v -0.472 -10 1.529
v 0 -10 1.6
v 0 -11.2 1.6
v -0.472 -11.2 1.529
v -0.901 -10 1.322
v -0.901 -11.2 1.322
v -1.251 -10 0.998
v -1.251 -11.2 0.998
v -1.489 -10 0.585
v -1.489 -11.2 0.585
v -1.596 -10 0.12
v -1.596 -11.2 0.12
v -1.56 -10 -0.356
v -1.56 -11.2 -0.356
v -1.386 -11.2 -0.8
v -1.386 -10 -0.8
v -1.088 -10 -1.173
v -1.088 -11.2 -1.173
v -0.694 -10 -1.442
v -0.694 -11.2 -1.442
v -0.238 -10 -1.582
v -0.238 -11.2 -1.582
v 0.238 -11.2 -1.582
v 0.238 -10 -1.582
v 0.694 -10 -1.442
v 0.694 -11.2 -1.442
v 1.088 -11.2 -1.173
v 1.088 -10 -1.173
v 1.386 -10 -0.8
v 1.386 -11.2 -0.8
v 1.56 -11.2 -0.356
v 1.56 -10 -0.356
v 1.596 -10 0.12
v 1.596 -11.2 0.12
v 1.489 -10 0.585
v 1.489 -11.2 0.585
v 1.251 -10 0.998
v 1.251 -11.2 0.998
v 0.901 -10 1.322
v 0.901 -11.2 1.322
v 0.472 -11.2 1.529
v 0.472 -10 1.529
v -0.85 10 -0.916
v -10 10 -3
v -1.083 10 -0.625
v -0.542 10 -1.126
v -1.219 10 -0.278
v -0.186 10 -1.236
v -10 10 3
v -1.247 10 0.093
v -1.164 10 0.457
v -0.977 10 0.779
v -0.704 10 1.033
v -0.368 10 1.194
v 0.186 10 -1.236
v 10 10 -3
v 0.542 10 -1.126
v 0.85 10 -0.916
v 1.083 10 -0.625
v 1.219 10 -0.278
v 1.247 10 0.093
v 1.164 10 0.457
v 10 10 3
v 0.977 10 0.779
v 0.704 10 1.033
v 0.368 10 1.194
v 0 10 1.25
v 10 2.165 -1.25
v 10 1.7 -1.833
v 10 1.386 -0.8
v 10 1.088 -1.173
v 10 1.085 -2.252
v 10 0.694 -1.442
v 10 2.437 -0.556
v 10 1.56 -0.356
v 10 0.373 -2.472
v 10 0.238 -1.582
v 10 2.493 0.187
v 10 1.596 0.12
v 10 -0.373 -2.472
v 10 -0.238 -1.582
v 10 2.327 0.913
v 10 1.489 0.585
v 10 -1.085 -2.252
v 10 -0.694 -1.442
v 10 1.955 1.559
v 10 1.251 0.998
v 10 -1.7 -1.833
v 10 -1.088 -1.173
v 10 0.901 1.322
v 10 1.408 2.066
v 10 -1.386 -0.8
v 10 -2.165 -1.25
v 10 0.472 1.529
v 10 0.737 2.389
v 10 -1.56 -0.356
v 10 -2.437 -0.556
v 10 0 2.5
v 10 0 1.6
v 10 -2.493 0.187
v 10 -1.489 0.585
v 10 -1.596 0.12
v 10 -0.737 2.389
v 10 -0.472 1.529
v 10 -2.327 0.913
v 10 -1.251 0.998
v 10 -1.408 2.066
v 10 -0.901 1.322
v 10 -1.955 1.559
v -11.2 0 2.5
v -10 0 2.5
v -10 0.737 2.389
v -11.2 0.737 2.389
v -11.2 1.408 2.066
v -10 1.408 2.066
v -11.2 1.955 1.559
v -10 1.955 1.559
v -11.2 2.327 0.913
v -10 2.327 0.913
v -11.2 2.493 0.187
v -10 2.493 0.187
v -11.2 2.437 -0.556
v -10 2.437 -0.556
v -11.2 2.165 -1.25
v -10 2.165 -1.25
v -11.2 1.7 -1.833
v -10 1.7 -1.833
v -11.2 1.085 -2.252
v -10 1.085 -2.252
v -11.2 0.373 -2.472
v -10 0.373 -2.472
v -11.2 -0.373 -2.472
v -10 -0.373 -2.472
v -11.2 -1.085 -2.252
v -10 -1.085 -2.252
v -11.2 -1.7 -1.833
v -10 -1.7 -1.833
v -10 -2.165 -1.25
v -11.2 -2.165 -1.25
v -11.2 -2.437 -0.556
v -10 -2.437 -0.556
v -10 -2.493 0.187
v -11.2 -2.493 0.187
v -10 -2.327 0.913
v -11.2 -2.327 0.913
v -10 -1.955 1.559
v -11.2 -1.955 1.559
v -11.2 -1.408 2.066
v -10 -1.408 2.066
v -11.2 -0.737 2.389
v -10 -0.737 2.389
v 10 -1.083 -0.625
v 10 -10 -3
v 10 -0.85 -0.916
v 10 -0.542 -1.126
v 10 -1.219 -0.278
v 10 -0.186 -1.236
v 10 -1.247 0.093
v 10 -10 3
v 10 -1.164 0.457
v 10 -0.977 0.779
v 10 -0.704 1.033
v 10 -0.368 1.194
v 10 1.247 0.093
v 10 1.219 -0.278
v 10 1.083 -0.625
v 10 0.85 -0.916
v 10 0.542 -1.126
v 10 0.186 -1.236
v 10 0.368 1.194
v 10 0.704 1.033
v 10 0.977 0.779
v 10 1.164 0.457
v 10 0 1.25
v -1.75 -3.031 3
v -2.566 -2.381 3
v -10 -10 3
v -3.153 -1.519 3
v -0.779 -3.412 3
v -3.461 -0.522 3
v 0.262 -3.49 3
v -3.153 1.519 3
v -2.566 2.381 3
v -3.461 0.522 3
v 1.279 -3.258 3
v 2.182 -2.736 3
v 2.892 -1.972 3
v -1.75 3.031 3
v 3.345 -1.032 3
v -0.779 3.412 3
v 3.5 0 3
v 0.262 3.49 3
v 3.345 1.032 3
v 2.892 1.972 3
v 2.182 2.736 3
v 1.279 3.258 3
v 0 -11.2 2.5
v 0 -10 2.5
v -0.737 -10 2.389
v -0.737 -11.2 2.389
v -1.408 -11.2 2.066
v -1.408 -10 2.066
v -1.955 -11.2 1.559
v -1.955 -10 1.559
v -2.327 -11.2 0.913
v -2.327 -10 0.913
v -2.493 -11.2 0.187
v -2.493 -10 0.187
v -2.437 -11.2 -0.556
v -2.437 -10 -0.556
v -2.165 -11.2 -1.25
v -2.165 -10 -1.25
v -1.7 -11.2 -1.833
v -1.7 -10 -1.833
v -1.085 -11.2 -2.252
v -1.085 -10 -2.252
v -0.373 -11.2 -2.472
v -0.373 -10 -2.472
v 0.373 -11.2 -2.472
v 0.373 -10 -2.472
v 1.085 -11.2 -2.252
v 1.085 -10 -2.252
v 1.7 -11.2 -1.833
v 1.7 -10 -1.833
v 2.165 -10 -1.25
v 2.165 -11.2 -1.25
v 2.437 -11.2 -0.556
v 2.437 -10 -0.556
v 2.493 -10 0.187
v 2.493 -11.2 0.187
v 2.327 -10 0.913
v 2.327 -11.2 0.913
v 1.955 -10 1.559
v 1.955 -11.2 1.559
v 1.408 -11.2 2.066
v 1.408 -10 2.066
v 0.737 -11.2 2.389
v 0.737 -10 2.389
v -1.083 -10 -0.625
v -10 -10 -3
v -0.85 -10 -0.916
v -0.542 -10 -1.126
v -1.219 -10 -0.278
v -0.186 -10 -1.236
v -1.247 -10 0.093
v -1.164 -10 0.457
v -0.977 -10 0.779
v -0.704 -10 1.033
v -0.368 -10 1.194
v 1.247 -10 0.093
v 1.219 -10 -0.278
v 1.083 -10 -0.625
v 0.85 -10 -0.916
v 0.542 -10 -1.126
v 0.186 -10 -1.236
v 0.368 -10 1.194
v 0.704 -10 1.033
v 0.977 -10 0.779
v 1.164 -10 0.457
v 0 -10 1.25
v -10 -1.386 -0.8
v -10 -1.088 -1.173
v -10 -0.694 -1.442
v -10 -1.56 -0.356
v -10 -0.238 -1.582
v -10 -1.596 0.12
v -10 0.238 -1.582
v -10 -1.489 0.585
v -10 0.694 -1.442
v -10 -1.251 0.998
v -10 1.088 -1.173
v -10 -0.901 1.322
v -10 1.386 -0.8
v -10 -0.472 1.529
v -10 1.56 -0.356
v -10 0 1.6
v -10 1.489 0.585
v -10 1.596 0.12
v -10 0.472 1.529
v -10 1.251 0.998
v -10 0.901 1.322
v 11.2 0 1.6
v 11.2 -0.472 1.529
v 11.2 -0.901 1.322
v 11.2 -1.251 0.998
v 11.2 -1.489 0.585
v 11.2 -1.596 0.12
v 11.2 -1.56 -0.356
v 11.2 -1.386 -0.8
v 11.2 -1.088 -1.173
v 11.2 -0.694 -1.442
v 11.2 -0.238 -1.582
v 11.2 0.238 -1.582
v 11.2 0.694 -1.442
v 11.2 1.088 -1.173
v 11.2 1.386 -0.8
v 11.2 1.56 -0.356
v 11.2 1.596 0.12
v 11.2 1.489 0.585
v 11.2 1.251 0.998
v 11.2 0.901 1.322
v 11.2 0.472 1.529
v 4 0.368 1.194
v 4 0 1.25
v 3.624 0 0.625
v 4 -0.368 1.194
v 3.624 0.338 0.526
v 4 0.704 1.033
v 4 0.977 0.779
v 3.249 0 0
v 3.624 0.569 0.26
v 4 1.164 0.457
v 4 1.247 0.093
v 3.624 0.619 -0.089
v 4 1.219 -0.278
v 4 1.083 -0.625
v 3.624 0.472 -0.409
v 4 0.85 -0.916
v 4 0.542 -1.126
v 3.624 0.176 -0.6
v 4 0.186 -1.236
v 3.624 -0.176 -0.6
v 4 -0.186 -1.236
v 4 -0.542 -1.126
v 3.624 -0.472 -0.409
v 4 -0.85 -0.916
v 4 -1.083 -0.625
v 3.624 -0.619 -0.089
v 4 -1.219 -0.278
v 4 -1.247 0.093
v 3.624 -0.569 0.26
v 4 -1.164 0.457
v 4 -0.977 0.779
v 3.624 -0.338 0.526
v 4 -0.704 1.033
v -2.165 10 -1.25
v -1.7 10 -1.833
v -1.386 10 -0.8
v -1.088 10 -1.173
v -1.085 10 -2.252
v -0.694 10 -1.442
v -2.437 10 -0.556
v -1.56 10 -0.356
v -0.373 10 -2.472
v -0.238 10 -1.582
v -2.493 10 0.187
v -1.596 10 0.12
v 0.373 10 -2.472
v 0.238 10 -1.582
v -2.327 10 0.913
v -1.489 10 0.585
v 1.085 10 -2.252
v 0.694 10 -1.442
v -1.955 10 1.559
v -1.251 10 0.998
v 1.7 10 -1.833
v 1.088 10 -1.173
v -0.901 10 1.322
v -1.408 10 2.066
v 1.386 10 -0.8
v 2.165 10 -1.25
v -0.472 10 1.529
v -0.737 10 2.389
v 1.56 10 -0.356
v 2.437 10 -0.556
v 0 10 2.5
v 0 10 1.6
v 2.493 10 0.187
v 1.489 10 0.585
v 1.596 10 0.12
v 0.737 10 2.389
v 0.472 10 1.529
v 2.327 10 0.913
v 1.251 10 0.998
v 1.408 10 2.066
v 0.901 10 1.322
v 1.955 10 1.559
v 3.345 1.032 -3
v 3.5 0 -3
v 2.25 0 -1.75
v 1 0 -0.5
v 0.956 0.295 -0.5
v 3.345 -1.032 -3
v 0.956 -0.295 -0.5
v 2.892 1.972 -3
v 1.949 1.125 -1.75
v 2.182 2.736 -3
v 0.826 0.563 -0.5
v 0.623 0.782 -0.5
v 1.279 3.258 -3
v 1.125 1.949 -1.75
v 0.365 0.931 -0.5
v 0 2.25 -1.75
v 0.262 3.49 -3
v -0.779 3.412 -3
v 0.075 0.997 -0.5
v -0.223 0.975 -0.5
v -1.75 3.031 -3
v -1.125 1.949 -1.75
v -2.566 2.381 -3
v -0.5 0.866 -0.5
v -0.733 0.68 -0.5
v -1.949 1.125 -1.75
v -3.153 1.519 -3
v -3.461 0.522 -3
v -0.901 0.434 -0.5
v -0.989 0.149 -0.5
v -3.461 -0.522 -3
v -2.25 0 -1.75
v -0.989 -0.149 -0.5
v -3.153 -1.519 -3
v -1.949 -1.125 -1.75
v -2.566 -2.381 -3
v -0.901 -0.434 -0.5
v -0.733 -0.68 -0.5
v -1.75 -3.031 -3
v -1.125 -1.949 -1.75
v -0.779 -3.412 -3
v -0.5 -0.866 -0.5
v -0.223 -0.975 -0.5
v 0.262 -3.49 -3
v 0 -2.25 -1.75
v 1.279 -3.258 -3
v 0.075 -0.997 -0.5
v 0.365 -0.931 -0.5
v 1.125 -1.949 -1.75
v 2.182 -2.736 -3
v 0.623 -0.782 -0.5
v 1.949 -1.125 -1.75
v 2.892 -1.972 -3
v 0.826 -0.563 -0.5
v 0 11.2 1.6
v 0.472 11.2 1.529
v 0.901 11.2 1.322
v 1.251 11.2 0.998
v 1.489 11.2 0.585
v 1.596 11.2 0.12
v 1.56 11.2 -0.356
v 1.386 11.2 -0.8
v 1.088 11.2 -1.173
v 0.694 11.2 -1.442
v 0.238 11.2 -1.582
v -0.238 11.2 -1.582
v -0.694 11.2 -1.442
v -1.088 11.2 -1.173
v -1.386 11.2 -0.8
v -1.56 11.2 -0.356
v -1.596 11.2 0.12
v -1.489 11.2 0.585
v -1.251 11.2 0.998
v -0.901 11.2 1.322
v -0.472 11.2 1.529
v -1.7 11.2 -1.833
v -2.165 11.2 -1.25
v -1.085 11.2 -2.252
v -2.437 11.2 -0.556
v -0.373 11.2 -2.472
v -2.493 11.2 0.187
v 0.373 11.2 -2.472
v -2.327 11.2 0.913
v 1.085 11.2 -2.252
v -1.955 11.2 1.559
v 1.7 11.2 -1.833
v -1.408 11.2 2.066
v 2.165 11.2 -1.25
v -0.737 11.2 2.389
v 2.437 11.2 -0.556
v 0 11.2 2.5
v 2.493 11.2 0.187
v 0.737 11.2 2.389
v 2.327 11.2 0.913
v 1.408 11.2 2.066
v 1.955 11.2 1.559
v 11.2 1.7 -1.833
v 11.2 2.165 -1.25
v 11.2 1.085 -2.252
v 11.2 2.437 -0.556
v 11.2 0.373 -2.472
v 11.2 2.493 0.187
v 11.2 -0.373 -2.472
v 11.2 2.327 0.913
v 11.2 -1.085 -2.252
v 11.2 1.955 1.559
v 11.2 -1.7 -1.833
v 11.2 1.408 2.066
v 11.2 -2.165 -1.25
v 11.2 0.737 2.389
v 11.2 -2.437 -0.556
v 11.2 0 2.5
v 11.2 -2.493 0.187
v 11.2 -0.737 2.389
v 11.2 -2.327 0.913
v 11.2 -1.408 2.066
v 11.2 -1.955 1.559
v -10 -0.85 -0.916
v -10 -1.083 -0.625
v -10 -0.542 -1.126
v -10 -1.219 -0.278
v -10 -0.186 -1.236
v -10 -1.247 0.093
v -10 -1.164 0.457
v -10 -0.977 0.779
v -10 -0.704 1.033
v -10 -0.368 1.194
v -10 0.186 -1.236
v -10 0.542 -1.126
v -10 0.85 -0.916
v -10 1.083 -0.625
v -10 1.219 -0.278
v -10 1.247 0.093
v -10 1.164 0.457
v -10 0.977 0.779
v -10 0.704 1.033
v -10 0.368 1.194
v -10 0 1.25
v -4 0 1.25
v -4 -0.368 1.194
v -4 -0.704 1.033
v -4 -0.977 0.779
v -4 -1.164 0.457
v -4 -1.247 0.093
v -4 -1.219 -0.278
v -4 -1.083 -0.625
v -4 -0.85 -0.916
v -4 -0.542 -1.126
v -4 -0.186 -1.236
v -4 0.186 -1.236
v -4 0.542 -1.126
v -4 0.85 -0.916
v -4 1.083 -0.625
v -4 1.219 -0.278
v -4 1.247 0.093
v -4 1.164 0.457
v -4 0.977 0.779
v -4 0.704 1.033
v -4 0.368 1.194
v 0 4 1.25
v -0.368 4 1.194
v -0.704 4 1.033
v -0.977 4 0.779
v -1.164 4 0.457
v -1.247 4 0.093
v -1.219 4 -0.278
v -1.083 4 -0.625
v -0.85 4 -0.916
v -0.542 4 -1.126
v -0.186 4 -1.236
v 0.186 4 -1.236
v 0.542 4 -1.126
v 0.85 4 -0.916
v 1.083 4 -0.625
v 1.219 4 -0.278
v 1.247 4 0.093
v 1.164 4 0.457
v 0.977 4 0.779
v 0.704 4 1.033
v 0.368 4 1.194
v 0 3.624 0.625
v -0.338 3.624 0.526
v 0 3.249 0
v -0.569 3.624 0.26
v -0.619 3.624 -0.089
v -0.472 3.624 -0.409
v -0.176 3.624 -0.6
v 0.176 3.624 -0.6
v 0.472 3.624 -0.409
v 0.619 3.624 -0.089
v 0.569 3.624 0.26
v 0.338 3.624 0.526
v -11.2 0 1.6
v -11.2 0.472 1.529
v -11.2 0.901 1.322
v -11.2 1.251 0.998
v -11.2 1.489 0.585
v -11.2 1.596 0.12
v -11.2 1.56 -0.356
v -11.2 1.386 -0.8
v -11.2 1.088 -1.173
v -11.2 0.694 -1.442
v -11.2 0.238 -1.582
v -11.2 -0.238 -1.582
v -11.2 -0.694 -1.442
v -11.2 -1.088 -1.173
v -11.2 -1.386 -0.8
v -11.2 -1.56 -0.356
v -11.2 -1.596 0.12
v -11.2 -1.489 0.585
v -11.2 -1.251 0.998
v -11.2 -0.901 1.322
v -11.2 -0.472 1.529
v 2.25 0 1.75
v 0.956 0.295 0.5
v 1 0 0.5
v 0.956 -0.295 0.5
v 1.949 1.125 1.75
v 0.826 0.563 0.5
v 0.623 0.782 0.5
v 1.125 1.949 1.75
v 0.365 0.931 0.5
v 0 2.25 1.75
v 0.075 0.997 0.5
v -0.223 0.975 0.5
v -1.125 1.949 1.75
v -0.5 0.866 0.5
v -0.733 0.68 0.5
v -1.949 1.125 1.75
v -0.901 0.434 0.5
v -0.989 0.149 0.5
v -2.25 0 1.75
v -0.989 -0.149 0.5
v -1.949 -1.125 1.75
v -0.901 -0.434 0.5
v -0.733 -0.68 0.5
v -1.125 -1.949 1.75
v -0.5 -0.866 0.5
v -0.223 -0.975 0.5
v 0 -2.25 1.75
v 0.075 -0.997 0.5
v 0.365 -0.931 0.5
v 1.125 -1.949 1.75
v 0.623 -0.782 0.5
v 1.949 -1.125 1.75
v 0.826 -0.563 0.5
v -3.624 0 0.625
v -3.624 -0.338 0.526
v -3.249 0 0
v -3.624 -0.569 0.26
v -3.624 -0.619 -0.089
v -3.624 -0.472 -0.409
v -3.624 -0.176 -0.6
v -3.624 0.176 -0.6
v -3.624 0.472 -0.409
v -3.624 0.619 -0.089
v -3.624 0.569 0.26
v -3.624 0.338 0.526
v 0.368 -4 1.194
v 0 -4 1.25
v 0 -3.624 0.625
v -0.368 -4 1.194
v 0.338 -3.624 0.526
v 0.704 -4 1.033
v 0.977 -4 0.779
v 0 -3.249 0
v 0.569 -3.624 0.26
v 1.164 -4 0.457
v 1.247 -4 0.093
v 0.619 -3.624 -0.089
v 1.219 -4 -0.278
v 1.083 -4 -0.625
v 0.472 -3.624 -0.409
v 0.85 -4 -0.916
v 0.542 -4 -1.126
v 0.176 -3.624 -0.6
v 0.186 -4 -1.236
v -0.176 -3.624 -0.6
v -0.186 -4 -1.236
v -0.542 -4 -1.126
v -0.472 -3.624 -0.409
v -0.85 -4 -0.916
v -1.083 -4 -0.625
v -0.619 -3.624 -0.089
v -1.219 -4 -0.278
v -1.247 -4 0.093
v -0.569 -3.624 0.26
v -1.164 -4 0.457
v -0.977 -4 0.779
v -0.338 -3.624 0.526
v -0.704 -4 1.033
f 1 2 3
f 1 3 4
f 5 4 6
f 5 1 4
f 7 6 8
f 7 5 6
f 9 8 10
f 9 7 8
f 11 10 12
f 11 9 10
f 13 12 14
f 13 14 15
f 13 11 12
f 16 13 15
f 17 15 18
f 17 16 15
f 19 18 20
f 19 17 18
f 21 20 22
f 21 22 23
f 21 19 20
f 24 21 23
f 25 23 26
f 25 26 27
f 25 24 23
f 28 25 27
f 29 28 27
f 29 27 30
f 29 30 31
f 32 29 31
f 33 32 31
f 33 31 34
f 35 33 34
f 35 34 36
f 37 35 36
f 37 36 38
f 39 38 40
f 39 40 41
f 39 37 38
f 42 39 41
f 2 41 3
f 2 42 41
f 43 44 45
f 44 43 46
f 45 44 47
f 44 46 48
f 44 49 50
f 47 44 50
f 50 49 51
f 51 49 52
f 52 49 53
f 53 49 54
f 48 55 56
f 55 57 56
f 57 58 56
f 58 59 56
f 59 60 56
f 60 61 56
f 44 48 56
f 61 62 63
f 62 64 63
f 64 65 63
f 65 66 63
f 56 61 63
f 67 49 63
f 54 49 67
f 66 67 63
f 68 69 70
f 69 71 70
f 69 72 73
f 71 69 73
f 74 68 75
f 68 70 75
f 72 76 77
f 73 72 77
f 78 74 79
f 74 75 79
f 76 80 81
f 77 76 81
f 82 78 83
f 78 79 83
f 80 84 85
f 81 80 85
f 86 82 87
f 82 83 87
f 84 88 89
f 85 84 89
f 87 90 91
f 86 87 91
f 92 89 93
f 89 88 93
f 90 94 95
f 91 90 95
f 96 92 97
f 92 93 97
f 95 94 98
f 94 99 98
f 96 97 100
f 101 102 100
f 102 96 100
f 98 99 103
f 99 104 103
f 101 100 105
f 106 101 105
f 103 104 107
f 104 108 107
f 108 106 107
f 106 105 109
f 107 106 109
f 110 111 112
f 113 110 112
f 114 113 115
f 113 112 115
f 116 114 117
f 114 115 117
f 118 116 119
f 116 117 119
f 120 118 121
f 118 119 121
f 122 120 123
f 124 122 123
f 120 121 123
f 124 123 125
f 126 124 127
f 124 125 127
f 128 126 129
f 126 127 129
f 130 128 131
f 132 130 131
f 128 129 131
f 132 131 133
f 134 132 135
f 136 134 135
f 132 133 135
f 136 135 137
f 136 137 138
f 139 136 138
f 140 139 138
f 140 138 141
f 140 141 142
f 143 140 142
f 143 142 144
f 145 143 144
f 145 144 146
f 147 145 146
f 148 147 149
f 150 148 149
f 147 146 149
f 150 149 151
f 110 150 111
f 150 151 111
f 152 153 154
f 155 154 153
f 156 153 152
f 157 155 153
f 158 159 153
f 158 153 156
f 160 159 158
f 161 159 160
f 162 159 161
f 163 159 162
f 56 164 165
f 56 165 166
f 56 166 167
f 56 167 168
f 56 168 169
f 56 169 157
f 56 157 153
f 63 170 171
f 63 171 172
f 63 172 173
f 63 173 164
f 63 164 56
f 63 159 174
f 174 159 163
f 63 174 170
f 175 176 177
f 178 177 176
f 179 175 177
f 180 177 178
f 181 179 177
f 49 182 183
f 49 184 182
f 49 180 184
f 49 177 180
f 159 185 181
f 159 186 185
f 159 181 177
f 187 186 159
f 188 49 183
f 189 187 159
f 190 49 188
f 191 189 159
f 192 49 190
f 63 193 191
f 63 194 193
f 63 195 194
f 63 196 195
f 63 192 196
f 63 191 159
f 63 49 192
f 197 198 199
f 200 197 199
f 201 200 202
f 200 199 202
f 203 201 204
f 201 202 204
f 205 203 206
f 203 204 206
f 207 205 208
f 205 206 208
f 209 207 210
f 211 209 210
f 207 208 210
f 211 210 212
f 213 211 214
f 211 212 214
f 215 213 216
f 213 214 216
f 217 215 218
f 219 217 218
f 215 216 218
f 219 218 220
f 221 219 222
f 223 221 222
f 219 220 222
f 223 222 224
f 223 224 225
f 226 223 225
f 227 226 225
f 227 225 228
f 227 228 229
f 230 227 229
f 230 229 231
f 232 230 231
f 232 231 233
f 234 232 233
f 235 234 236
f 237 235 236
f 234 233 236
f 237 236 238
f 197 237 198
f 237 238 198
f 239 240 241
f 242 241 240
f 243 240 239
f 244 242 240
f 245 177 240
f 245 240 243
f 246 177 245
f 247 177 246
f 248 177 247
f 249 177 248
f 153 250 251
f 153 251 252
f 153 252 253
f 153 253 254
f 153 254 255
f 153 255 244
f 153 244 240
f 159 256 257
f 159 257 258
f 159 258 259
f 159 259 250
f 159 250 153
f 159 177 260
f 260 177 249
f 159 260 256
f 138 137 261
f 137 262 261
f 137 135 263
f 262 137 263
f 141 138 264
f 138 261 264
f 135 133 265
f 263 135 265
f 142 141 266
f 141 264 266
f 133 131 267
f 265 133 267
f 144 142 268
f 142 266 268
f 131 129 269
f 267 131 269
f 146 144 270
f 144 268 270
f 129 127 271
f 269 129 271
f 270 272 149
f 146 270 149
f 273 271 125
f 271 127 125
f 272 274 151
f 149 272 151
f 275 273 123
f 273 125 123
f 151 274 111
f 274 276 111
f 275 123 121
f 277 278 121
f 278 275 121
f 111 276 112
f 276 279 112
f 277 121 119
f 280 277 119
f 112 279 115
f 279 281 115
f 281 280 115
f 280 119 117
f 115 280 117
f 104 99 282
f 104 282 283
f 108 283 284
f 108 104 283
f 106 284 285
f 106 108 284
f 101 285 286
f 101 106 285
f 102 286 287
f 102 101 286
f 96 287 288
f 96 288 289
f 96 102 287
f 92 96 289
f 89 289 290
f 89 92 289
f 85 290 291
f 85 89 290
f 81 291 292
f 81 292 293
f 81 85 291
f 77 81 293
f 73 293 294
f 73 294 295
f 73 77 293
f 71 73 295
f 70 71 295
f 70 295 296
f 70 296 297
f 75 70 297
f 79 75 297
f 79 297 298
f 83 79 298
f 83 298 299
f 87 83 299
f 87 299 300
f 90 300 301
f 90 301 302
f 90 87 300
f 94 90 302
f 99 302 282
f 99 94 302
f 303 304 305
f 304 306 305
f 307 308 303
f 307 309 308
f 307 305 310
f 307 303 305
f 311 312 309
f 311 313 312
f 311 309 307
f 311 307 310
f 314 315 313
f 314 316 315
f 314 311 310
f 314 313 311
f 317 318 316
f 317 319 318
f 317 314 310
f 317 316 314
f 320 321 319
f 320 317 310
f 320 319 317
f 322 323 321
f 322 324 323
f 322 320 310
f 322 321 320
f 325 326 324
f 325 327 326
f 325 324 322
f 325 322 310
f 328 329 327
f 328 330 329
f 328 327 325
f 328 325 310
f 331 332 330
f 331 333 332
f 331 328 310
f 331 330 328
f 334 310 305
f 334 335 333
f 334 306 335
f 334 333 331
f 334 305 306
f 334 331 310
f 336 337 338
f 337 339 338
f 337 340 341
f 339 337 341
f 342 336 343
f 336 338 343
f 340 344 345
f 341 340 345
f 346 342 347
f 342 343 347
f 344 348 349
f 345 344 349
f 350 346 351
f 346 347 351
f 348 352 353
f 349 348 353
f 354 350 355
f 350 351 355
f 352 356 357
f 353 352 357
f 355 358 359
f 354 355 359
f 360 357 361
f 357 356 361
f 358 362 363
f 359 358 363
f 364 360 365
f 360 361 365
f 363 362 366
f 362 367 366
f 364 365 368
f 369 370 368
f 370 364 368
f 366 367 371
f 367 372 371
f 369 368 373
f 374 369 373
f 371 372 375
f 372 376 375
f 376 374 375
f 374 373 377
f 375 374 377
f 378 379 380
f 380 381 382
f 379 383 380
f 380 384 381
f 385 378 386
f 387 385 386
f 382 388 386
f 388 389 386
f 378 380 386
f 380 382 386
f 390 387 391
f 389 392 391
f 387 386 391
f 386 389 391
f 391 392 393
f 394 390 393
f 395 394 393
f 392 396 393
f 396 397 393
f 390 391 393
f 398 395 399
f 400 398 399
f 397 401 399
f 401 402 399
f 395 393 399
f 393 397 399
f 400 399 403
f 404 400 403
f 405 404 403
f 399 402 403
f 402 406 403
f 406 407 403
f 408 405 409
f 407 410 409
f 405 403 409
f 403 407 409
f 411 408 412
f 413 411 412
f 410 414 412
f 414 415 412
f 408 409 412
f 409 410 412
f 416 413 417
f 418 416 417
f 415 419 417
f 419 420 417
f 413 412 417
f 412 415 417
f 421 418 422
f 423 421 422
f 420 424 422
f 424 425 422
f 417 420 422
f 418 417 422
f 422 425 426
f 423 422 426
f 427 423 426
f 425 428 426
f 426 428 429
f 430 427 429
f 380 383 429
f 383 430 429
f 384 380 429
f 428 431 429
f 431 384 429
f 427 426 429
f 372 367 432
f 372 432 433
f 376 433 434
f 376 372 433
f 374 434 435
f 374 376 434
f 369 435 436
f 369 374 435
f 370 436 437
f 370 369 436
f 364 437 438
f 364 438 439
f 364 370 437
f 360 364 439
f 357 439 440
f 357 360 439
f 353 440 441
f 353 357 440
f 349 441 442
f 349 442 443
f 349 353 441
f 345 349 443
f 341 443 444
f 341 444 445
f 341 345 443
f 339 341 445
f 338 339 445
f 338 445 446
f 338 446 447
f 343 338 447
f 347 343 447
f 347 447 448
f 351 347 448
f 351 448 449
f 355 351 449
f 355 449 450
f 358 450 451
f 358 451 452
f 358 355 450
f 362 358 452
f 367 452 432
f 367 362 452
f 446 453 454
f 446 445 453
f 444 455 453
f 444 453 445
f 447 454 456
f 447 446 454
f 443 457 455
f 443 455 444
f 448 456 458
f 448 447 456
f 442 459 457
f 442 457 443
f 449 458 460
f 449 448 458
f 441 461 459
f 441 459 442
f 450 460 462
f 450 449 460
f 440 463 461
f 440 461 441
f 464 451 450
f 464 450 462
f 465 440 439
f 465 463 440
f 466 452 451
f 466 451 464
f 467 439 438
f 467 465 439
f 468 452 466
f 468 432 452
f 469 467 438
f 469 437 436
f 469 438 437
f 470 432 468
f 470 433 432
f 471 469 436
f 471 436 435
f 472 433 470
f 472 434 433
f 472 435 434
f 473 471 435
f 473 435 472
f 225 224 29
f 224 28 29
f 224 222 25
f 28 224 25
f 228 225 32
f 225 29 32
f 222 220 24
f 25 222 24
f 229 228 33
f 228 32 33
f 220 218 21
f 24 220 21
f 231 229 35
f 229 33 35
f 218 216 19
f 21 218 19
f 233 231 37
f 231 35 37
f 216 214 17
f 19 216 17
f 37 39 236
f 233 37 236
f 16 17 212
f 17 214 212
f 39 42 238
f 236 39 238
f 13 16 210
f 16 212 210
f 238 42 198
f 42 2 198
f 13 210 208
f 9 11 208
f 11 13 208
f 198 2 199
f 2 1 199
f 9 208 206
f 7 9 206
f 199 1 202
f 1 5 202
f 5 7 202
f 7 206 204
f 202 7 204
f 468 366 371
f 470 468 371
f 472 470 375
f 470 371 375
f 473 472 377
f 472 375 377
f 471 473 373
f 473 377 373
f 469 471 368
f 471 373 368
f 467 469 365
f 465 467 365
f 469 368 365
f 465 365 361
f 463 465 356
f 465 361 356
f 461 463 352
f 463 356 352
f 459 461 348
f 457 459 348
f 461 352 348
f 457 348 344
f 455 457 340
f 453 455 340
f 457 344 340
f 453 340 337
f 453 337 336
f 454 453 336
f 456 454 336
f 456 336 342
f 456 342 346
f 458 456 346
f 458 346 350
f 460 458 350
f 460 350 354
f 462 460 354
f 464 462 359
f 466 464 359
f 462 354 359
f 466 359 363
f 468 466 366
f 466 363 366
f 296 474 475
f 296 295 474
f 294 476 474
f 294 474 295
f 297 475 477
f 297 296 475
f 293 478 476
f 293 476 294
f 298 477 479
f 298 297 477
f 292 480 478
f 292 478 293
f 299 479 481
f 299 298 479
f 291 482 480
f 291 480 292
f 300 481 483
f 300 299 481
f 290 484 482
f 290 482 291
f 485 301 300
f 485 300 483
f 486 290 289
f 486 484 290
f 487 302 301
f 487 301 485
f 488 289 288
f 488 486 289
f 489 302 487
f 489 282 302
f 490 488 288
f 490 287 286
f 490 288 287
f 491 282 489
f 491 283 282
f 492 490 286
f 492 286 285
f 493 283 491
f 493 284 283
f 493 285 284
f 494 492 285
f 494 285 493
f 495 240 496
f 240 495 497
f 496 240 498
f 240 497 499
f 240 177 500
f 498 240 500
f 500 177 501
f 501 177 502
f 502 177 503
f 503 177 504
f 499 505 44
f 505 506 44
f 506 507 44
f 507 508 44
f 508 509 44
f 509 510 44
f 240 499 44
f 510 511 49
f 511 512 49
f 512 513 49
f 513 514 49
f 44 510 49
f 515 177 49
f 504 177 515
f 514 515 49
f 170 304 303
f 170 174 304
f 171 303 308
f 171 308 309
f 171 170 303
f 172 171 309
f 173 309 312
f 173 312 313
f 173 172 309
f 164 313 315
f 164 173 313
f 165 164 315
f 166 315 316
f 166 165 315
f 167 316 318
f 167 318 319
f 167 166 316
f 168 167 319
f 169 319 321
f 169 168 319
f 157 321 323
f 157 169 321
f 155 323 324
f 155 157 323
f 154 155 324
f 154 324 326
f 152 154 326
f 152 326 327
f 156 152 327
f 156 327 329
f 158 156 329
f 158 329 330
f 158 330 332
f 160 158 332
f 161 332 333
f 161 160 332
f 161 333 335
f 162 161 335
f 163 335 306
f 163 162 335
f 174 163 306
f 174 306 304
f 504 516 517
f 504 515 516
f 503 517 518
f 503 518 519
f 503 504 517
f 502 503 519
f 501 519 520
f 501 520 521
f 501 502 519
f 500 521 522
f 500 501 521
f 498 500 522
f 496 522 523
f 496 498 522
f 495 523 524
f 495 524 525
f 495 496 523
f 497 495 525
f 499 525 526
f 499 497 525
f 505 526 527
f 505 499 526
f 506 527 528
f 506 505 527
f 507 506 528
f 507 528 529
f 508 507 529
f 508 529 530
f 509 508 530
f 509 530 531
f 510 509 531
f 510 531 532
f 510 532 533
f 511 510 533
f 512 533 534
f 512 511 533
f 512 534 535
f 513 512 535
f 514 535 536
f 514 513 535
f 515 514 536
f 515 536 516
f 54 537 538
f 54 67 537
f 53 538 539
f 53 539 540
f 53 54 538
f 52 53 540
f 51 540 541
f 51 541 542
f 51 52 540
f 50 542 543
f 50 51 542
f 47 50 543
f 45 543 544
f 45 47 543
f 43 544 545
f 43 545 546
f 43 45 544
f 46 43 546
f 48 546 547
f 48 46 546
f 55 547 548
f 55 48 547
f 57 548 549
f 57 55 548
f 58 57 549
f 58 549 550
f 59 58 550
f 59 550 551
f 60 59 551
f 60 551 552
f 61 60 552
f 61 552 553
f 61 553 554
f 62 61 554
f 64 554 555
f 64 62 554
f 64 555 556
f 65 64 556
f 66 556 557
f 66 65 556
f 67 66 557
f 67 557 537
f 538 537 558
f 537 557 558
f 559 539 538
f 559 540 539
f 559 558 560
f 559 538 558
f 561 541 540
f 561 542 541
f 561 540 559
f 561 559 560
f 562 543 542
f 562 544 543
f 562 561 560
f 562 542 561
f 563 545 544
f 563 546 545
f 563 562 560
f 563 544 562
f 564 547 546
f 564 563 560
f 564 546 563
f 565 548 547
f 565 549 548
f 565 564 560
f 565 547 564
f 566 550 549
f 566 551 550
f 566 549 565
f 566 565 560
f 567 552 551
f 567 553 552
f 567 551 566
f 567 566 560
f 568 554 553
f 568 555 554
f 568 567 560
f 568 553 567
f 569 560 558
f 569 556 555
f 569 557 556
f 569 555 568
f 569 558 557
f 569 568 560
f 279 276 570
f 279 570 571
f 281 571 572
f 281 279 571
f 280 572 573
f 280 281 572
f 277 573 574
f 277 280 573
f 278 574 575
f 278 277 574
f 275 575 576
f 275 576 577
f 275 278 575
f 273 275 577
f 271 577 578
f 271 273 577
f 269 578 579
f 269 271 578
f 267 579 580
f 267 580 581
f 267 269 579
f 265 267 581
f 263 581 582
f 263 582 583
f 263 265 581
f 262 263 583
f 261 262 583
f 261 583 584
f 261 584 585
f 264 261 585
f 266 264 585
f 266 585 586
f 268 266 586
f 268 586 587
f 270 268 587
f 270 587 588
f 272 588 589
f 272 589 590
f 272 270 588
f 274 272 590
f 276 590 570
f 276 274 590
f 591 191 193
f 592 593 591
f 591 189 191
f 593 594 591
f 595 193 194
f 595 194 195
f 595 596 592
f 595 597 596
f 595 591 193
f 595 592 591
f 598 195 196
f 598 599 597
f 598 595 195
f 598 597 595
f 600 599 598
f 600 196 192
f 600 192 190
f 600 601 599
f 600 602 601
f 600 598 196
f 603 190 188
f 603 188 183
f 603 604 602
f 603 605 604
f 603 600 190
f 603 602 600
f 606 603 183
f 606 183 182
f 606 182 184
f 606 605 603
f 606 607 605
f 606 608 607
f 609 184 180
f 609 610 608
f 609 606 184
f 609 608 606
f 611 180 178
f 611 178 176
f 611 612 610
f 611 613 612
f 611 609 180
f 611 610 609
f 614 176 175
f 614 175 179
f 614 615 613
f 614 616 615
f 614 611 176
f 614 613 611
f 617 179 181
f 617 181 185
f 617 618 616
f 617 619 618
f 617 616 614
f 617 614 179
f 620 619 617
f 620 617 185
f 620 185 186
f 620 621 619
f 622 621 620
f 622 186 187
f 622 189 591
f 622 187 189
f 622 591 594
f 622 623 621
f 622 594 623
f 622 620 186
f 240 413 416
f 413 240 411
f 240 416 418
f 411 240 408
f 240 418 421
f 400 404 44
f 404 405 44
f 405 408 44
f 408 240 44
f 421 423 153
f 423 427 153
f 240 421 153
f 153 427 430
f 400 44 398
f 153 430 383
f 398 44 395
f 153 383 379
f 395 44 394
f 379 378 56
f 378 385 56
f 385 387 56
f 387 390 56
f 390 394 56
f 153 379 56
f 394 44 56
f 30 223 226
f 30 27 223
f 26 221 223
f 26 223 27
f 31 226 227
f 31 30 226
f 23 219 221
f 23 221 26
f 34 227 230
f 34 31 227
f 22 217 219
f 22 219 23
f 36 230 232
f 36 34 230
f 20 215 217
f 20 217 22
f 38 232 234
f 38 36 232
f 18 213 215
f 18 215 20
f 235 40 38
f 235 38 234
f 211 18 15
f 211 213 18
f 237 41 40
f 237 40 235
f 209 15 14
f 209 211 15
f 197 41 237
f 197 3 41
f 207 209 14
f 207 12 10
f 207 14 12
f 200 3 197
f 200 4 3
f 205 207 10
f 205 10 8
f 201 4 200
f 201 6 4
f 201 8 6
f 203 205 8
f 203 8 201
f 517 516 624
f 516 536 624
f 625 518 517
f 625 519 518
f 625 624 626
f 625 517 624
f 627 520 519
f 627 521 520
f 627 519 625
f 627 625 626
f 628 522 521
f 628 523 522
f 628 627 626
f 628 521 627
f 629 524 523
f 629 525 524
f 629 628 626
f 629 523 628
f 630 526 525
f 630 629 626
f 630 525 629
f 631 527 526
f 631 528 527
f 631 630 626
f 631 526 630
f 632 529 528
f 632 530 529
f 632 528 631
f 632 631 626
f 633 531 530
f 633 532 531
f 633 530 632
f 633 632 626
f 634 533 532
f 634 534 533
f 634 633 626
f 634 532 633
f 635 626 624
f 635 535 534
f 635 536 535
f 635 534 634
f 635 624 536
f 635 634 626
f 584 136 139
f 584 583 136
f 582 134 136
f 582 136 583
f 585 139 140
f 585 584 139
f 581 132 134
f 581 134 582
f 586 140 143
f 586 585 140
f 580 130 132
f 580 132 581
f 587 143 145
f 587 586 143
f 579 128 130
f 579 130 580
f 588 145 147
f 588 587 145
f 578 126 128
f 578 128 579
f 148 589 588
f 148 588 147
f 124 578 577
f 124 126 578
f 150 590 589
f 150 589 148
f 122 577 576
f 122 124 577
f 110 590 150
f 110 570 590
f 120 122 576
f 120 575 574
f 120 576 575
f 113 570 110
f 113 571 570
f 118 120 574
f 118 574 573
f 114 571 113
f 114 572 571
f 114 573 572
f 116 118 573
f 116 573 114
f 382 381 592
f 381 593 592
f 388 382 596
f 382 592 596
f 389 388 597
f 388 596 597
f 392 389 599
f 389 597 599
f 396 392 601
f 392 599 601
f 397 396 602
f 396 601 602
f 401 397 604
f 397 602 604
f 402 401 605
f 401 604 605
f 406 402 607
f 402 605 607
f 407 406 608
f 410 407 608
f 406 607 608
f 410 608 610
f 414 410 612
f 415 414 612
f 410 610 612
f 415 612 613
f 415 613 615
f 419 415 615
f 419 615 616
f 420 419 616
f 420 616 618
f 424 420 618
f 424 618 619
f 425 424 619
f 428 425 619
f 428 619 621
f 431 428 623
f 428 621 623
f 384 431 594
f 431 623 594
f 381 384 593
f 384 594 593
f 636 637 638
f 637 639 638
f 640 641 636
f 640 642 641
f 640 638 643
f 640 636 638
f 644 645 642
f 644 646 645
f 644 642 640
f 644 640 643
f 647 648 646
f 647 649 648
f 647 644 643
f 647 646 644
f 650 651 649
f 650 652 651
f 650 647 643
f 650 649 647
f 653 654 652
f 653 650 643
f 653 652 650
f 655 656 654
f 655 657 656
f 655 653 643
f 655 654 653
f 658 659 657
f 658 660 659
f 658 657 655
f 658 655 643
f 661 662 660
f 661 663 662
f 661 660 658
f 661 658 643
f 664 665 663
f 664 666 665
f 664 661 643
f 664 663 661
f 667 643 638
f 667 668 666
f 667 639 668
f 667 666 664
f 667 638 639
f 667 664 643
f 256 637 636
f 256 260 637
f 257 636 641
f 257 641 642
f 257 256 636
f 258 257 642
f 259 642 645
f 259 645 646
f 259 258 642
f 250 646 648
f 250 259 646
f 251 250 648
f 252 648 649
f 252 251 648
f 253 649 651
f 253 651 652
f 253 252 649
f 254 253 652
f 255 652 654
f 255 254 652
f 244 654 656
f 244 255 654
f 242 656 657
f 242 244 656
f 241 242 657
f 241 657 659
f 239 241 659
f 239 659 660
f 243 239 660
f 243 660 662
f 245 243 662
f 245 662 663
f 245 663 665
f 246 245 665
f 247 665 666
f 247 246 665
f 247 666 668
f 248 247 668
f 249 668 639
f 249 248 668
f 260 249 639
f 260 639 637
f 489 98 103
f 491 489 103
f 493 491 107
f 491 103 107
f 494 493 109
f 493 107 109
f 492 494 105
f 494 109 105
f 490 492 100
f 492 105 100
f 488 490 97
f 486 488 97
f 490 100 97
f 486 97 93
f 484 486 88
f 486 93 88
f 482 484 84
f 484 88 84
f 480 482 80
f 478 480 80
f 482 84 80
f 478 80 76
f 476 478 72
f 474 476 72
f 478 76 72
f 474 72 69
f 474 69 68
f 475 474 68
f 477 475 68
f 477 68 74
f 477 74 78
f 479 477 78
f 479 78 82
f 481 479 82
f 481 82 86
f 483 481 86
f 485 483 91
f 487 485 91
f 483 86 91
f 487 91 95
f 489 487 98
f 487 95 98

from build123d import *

# Parameters (mm, degrees)
SKETCH_1_W               = 20
SKETCH_1_H               = 20
SKETCH_1_R               = 1
EXTRUDE_1_DEPTH          = 3
PATTERN_CIRCULAR_1_COUNT = 4
SKETCH_6_R               = 2.5
SKETCH_6_R_2             = 1.6
EXTRUDE_2_DEPTH          = 1.2
PATTERN_CIRCULAR_2_COUNT = 4


with BuildPart() as part:
    # ｽｹｯﾁ1 → ﾎﾞｽ - 押し出し1 (new body)
    with BuildSketch(Plane.XY):
        Rectangle(SKETCH_1_W, SKETCH_1_H)
        Circle(SKETCH_1_R, mode=Mode.SUBTRACT)
    extrude(amount=EXTRUDE_1_DEPTH)

    # ｽｹｯﾁ2 → ｶｯﾄ - 回転1 (revolve, cut)
    with BuildSketch(Plane(origin=(0, 0, 0), x_dir=(1, 0, 0), z_dir=(0, 1, 0))):
        Polygon((1, -0.5), (0, -0.5), (0, -3), (3.5, -3), align=None)
    revolve(axis=Axis((0, 0, 0.5), (0, 0, 1)), mode=Mode.SUBTRACT)

    # ﾐﾗｰ1: part across plane


with BuildPart() as part_1:
    add(part.part)
    add(part.part.mirror(Plane.XY))

    # ｽｹｯﾁ5 → M3x0.5 ねじ穴1 (revolve, cut)
    with BuildSketch(Plane(origin=(-10, 0, 0), x_dir=(0, 0, 1), z_dir=(0, 1, 0))):
        Polygon((0, 0), (0, 6.751075774), (1.25, 6), (1.25, 0), align=None)
    m3x0_5_1 = revolve(axis=Axis((-16.35, 0, 0), (1, 0, 0)), mode=Mode.SUBTRACT)

    # 円形ﾊﾟﾀｰﾝ1: M3x0.5 ねじ穴1 ×4 about axis
    pattern_circular_1_axis = Axis((0, 0, 3), (0, 0, -1))
    for i in range(1, PATTERN_CIRCULAR_1_COUNT):
        add(m3x0_5_1.rotate(pattern_circular_1_axis, i * 360 / PATTERN_CIRCULAR_1_COUNT), mode=Mode.SUBTRACT)


with BuildPart() as body_2:
    # ｽｹｯﾁ6 → ﾎﾞｽ - 押し出し2 (new body)
    with BuildSketch(Plane(origin=(0, 10, 0), x_dir=(1, 0, 0), z_dir=(0, 1, 0))):
        with Locations(Location((0, 0, 0), (0, 0, 270))):
            Circle(SKETCH_6_R)
        with Locations(Location((0, 0, 0), (0, 0, 270))):
            Circle(SKETCH_6_R_2, mode=Mode.SUBTRACT)
    extrude(amount=EXTRUDE_2_DEPTH)


with BuildPart() as pattern_circular_2_1:
    # 円形ﾊﾟﾀｰﾝ2: pattern copy
    add(body_2.part.rotate(Axis((0, 0, 0), (0, 0, 1)), 1 * 360 / PATTERN_CIRCULAR_2_COUNT))


with BuildPart() as pattern_circular_2_2:
    # 円形ﾊﾟﾀｰﾝ2: pattern copy
    add(body_2.part.rotate(Axis((0, 0, 0), (0, 0, 1)), 2 * 360 / PATTERN_CIRCULAR_2_COUNT))


with BuildPart() as pattern_circular_2_3:
    # 円形ﾊﾟﾀｰﾝ2: pattern copy
    add(body_2.part.rotate(Axis((0, 0, 0), (0, 0, 1)), 3 * 360 / PATTERN_CIRCULAR_2_COUNT))


solid = Compound([part_1.part, body_2.part, pattern_circular_2_1.part, pattern_circular_2_2.part, pattern_circular_2_3.part])
